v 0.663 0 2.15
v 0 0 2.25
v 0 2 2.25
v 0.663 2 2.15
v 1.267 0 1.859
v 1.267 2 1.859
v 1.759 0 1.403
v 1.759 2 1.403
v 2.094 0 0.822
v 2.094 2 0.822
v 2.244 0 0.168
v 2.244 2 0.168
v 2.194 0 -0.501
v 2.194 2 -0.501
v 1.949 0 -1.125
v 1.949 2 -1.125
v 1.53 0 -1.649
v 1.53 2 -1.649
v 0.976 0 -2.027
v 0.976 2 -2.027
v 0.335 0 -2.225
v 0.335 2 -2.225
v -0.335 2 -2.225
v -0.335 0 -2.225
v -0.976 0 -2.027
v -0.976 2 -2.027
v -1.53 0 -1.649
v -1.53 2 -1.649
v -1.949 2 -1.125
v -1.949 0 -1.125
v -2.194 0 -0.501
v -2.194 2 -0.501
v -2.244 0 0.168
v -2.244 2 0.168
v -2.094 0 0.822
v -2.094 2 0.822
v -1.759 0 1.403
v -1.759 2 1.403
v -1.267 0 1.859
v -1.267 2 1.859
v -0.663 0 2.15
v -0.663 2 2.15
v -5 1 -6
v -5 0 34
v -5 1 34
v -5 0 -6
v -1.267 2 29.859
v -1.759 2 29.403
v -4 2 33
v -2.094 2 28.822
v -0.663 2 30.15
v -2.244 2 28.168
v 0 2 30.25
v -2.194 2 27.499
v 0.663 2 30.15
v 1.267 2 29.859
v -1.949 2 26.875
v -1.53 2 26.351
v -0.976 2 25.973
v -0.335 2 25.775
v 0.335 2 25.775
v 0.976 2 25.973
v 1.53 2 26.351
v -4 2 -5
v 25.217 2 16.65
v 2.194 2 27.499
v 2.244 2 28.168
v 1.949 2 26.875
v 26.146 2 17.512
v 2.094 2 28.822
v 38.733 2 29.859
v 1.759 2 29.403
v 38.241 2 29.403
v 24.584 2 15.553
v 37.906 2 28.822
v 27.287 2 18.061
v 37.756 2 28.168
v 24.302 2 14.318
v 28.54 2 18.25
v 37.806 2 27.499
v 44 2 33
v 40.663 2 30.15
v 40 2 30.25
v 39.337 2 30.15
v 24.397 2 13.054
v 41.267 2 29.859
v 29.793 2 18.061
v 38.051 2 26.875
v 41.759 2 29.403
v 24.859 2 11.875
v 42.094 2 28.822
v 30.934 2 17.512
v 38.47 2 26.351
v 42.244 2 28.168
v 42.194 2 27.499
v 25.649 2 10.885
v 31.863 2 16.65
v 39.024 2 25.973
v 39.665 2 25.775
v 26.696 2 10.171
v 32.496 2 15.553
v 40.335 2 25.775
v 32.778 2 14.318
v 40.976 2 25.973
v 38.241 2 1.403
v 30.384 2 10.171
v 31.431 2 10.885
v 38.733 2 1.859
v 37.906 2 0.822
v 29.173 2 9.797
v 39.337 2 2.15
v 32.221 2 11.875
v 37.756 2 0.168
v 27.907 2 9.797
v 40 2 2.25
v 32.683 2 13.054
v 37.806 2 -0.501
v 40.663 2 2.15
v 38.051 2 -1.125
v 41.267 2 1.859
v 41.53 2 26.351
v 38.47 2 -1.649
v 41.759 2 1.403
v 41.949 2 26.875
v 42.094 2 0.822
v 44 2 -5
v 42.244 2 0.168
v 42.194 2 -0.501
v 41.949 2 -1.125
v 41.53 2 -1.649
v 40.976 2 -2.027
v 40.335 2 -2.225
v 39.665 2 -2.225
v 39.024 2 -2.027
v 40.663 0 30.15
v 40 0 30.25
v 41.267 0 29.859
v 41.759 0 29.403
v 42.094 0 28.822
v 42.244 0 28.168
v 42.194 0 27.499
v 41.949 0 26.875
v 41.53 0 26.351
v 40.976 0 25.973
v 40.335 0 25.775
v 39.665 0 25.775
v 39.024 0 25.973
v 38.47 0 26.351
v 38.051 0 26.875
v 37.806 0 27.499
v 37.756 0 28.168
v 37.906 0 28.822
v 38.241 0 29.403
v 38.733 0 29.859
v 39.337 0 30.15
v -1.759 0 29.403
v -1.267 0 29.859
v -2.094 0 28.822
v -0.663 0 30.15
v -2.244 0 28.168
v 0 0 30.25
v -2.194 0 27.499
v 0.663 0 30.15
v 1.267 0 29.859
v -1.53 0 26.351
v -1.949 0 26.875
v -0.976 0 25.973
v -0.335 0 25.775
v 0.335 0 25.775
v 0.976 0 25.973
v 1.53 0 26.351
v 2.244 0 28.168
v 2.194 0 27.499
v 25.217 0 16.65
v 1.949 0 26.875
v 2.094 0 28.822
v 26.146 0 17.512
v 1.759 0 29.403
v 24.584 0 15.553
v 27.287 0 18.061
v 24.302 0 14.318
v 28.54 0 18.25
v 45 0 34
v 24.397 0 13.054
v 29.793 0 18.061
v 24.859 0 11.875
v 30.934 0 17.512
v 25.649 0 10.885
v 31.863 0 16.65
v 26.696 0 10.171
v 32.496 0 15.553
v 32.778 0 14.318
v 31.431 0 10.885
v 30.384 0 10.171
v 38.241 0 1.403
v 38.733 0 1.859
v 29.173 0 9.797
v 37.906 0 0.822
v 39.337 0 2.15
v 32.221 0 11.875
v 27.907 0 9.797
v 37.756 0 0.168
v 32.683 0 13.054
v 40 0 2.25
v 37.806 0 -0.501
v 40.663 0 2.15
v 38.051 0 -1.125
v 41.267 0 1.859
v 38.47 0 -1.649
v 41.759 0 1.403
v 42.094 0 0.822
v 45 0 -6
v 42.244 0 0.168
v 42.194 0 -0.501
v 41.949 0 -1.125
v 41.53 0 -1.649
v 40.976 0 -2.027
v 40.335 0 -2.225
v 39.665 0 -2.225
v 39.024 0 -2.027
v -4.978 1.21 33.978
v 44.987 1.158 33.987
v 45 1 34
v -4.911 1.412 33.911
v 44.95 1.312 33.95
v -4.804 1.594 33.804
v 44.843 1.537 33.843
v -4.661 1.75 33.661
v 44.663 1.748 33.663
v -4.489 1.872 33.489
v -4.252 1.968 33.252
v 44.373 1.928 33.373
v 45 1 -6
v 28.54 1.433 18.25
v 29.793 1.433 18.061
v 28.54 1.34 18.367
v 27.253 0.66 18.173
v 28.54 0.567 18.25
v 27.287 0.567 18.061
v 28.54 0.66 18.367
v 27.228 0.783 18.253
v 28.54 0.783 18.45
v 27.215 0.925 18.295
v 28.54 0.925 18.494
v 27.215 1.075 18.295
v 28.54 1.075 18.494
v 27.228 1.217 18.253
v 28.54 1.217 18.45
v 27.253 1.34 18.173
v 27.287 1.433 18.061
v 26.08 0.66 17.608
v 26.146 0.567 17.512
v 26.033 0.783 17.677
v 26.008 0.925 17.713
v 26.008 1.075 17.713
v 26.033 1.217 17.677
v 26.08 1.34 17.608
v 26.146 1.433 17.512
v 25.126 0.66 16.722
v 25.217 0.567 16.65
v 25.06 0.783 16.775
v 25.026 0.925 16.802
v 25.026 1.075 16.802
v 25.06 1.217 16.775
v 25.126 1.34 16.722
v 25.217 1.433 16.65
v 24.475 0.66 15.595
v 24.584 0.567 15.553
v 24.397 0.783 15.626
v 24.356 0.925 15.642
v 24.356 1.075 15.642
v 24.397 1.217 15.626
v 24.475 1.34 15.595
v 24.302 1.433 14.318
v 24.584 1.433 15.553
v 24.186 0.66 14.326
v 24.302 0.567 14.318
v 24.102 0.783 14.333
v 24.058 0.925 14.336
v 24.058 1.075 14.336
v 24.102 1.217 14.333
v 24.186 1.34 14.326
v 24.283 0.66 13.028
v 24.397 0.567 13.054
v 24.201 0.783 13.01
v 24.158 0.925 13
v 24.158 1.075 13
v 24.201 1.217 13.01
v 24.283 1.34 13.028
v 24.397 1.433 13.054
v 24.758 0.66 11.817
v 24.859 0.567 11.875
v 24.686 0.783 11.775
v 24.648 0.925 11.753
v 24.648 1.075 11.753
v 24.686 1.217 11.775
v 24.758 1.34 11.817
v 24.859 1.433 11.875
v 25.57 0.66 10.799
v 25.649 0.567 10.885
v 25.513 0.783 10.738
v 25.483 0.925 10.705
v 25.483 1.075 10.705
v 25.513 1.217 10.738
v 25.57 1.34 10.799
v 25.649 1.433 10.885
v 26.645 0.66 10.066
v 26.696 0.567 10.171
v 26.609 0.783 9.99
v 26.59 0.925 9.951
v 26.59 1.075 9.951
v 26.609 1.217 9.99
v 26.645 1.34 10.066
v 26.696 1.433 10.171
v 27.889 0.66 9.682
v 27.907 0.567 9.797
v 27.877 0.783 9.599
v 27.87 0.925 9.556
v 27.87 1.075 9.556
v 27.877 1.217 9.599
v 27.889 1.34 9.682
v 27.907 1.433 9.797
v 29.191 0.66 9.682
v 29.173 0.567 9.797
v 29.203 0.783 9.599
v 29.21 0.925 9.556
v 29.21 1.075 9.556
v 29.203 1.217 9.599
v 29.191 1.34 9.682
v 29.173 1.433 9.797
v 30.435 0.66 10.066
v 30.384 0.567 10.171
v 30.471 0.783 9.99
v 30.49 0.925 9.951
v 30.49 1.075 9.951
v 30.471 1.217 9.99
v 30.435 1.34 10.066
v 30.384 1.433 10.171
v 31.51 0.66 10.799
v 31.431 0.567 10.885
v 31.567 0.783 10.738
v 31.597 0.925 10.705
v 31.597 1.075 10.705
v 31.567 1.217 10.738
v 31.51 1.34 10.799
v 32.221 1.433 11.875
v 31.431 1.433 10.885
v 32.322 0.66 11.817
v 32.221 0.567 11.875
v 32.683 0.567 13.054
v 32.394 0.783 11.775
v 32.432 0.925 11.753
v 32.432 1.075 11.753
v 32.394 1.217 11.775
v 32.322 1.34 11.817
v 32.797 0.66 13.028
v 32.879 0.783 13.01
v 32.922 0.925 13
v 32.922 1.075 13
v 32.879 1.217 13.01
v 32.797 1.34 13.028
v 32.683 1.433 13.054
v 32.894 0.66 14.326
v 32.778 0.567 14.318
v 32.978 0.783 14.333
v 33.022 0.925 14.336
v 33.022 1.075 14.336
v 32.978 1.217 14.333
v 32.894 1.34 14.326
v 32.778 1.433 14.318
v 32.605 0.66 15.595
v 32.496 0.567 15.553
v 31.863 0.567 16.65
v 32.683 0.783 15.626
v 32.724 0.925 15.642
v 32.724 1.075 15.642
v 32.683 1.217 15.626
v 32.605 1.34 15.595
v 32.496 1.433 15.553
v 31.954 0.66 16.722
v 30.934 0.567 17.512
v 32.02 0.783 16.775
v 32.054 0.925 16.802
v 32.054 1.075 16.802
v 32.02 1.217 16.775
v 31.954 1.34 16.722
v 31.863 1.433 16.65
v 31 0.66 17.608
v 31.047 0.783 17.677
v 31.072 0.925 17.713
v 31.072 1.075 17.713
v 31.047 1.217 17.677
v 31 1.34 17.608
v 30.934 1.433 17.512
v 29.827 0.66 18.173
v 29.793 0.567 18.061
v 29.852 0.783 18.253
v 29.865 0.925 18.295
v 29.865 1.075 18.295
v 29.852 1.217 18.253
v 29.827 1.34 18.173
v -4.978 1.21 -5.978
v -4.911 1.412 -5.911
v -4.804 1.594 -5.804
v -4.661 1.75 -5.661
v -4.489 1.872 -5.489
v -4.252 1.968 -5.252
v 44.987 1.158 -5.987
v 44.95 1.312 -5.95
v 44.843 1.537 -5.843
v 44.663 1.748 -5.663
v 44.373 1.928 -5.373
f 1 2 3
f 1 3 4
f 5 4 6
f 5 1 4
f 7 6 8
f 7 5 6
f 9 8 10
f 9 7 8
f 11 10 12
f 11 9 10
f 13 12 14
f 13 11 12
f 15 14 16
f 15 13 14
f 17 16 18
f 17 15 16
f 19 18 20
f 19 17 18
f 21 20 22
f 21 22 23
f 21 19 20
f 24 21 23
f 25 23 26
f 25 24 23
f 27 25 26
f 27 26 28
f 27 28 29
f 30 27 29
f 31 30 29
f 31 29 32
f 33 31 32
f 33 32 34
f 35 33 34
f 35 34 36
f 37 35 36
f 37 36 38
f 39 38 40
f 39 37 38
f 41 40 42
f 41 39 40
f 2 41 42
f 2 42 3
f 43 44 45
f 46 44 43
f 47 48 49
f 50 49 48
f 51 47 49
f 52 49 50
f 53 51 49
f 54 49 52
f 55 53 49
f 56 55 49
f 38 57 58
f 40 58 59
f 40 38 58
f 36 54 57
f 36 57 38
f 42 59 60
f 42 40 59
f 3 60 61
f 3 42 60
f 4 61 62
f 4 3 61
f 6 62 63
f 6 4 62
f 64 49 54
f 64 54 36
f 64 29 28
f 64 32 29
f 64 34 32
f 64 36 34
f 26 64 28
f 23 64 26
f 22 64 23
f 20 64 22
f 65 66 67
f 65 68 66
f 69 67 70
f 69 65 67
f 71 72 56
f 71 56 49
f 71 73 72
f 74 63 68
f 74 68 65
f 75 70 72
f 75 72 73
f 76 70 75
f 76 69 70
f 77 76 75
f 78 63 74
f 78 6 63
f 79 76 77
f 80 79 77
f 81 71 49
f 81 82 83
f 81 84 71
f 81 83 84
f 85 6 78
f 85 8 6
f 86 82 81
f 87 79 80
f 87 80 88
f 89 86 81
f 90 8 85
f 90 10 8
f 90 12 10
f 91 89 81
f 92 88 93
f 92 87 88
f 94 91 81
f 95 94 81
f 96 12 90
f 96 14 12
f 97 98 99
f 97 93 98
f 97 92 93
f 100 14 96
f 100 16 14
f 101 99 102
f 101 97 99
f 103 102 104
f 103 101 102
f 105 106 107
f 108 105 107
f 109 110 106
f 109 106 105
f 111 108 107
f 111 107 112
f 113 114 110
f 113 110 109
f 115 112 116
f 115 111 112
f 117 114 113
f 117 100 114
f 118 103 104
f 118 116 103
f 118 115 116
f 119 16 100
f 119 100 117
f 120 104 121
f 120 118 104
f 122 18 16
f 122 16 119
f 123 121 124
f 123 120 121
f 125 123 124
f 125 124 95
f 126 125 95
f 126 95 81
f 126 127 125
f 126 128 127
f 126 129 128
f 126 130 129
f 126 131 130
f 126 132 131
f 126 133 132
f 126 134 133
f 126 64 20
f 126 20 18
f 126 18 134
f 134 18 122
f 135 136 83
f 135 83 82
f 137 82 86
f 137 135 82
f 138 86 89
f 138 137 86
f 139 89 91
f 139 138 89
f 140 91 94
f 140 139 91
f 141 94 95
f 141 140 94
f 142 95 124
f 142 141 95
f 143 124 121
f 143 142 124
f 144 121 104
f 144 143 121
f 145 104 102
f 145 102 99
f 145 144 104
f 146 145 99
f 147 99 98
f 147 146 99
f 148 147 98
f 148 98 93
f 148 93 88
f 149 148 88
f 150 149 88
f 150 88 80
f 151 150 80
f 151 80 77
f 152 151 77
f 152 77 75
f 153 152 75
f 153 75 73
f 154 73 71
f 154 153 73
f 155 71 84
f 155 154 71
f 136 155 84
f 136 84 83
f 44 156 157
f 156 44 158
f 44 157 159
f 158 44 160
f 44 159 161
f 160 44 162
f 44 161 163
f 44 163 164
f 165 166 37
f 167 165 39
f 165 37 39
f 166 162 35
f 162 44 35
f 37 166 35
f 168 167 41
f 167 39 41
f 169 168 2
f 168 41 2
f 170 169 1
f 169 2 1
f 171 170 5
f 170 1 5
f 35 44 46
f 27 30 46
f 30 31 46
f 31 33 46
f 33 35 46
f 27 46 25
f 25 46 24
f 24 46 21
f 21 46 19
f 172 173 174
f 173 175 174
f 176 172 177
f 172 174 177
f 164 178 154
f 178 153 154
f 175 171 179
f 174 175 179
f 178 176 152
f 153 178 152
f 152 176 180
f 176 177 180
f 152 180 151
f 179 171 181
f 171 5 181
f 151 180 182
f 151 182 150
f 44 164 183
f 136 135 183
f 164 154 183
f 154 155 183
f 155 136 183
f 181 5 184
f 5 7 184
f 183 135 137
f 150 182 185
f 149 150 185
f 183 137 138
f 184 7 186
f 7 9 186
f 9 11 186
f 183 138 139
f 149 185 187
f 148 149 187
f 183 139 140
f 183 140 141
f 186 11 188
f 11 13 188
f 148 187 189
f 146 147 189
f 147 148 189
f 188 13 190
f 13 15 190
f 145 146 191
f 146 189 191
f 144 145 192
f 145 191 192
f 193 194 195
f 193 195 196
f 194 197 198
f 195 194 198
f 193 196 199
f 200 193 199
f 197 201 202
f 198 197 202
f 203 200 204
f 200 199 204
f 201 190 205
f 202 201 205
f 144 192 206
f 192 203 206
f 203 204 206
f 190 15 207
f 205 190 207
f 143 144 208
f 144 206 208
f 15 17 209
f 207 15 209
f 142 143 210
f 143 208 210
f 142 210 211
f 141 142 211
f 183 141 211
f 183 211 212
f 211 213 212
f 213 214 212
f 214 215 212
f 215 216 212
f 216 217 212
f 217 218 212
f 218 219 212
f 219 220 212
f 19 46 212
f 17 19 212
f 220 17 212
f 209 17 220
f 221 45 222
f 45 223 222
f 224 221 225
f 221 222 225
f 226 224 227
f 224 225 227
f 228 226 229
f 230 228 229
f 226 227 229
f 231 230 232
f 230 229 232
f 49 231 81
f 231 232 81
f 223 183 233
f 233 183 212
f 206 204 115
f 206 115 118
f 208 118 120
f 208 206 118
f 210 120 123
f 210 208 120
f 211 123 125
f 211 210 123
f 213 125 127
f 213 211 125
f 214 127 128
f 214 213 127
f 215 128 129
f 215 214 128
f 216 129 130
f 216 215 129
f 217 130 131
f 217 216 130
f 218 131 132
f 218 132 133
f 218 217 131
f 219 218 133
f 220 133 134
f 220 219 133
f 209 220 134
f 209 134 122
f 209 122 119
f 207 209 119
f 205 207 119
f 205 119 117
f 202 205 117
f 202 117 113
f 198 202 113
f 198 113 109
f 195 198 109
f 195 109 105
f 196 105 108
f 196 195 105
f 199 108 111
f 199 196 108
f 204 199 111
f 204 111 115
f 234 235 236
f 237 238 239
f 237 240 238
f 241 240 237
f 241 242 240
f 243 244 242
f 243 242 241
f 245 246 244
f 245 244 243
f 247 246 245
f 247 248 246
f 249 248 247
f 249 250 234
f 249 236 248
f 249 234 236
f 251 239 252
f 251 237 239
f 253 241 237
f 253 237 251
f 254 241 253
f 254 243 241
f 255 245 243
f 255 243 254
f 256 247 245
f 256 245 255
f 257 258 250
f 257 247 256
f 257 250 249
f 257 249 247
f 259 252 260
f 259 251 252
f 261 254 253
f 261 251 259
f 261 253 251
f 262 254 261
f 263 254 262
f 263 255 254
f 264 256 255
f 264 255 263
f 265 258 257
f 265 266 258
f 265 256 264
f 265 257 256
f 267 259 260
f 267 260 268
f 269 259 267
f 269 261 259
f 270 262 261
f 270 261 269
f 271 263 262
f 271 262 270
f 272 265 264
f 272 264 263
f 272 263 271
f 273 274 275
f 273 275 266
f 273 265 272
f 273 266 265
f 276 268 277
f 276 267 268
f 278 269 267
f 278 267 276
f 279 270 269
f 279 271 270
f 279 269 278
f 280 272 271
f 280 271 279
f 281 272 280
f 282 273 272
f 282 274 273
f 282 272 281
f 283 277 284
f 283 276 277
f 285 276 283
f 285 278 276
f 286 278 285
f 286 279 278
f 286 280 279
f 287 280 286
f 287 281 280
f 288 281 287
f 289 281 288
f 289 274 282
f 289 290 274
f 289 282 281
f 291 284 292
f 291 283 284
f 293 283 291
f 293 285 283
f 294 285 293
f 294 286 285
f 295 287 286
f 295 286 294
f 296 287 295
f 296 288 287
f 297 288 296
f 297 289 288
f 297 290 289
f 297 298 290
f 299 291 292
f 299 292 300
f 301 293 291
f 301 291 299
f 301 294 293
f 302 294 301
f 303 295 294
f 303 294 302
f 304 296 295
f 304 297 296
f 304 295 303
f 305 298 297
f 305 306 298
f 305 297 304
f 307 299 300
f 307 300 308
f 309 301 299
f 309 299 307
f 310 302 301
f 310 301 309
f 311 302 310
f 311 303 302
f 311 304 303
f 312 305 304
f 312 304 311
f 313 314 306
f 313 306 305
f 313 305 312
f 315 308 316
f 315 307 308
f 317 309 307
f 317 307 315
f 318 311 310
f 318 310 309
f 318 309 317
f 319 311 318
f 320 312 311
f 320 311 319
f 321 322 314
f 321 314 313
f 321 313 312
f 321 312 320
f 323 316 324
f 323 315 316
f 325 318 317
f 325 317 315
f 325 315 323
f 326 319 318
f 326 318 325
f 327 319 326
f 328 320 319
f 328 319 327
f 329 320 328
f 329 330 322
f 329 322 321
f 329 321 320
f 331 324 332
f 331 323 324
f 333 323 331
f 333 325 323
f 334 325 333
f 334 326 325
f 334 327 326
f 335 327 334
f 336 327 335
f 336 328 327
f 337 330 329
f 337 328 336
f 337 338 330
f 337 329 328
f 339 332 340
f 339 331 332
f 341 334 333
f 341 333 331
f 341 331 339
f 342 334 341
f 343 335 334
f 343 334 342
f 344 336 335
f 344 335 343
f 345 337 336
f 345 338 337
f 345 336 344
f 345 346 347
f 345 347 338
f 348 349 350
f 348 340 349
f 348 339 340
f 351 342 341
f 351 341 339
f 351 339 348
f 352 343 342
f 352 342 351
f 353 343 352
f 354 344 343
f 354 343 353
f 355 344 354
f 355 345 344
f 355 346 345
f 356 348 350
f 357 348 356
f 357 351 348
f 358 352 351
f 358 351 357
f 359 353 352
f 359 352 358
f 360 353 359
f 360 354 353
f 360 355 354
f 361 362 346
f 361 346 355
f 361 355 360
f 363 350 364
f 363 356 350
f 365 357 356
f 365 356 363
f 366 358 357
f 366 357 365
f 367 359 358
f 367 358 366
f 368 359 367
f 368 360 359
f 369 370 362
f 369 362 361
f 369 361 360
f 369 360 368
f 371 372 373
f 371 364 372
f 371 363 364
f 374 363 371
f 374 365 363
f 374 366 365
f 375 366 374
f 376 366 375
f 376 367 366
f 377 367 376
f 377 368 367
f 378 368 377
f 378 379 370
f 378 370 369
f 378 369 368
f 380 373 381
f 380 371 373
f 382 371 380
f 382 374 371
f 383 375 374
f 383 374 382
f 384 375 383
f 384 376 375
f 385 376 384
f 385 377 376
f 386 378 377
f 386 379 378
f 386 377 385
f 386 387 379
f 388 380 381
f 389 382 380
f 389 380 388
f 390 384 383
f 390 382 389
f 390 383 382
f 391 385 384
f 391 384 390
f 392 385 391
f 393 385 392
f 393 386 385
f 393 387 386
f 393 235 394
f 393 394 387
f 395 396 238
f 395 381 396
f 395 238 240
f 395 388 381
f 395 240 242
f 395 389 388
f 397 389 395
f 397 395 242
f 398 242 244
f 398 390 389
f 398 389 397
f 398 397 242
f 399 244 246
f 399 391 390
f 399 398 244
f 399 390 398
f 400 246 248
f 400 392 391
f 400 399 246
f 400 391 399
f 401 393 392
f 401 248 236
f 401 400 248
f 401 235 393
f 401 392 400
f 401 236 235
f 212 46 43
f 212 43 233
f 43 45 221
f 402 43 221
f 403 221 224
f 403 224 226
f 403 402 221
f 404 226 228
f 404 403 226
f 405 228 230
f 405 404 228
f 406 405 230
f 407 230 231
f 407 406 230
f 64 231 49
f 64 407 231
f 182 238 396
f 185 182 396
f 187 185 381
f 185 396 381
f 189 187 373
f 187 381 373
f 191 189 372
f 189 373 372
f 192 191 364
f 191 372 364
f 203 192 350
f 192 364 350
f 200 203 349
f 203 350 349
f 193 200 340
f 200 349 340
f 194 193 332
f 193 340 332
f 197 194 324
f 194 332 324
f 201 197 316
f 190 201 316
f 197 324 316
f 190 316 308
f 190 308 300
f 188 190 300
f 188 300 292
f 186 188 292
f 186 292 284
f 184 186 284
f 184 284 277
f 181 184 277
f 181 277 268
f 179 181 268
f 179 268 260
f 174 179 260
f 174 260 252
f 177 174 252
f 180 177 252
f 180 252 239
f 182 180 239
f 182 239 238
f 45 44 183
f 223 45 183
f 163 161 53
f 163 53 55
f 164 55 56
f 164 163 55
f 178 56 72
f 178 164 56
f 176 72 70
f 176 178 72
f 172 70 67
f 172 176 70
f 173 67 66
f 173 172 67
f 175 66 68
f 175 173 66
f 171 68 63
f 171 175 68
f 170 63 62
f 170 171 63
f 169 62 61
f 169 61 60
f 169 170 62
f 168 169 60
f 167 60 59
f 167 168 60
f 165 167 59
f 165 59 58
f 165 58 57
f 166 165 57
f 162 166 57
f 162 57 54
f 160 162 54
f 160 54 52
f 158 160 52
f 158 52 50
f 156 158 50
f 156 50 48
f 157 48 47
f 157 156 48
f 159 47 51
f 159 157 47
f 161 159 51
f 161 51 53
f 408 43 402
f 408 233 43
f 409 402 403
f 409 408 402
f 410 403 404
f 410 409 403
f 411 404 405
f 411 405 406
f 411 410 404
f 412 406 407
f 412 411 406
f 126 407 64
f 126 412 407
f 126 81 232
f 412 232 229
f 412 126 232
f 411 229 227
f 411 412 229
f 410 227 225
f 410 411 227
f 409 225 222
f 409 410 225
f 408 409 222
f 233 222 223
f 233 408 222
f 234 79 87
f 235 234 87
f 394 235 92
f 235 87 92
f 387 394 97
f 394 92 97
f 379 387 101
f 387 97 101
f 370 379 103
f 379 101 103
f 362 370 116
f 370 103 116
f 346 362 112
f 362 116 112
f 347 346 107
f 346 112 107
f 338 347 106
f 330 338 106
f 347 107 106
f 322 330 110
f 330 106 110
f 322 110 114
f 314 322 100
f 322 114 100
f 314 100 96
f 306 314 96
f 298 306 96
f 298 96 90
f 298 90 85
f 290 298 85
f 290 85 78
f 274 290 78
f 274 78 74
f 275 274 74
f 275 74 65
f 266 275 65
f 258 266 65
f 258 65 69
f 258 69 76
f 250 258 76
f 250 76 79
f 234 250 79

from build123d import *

# Parameters (mm, degrees)
SKETCH2_W           = 50
SKETCH2_H           = 40
SKETCH2_R           = 2.25
BOSS_EXTRUDE1_DEPTH = 2
CUT_EXTRUDE3_REACH  = 58.436
SKETCH4_R           = 4.25
FILLET2_R           = 1


with BuildPart() as part:
    # Sketch2 → Boss-Extrude1 (new body)
    with BuildSketch(Plane(origin=(0, 0, 0), x_dir=(1, 0, 0), z_dir=(0, 1, 0))):
        with Locations((20, -14)):
            Rectangle(SKETCH2_W, SKETCH2_H)
        with Locations(Location((0, 0, 0), (0, 0, 270))):
            Circle(SKETCH2_R, mode=Mode.SUBTRACT)
        with Locations(Location((40, 0, 0), (0, 0, 270))):
            Circle(SKETCH2_R, mode=Mode.SUBTRACT)
        with Locations(Location((0, -28, 0), (0, 0, 270))):
            Circle(SKETCH2_R, mode=Mode.SUBTRACT)
        with Locations(Location((40, -28, 0), (0, 0, 270))):
            Circle(SKETCH2_R, mode=Mode.SUBTRACT)
    extrude(amount=BOSS_EXTRUDE1_DEPTH)

    # Sketch4 → Cut-Extrude3 (cut, up to next)
    with BuildSketch(Plane(origin=(0, 2, 0), x_dir=(1, 0, 0), z_dir=(0, 1, 0)), mode=Mode.PRIVATE) as cut_extrude3_sk1:
        with Locations(Location((28.54, -14, 0), (0, 0, 270))):
            Circle(SKETCH4_R)
    cut_extrude3_tool1 = extrude(cut_extrude3_sk1.sketch, amount=-CUT_EXTRUDE3_REACH, mode=Mode.PRIVATE) & part.part
    add(cut_extrude3_tool1.solids().sort_by_distance((28.54, 2, 14))[0], mode=Mode.SUBTRACT)

    # Sketch7 → Cut-Revolve1 (revolve, cut)
    with BuildSketch(Plane(origin=(0, 0, 14), x_dir=(-1, 0, 0), z_dir=(0, 0, -1)), mode=Mode.PRIVATE) as cut_revolve1_sk:
        with BuildLine():
            Line((-24.54, 1.5), (-24.54, 0.5))
            ThreePointArc((-24.54, 0.5), (-24.04, 1), (-24.54, 1.5))
        make_face()
    revolve(cut_revolve1_sk.sketch.rotate(Axis((28.54, 2, 14), (0, -1, 0)), 270), axis=Axis((28.54, 2, 14), (0, -1, 0)), mode=Mode.SUBTRACT)

    # Fillet2
    fillet2_edges = [part.edges().sort_by_distance(p)[0] for p in [
        (45, 2, 14),
        (20, 2, -6),
        (-5, 2, 14),
        (20, 2, 34),
    ]]
    fillet(fillet2_edges, radius=FILLET2_R)


solid = part.part
